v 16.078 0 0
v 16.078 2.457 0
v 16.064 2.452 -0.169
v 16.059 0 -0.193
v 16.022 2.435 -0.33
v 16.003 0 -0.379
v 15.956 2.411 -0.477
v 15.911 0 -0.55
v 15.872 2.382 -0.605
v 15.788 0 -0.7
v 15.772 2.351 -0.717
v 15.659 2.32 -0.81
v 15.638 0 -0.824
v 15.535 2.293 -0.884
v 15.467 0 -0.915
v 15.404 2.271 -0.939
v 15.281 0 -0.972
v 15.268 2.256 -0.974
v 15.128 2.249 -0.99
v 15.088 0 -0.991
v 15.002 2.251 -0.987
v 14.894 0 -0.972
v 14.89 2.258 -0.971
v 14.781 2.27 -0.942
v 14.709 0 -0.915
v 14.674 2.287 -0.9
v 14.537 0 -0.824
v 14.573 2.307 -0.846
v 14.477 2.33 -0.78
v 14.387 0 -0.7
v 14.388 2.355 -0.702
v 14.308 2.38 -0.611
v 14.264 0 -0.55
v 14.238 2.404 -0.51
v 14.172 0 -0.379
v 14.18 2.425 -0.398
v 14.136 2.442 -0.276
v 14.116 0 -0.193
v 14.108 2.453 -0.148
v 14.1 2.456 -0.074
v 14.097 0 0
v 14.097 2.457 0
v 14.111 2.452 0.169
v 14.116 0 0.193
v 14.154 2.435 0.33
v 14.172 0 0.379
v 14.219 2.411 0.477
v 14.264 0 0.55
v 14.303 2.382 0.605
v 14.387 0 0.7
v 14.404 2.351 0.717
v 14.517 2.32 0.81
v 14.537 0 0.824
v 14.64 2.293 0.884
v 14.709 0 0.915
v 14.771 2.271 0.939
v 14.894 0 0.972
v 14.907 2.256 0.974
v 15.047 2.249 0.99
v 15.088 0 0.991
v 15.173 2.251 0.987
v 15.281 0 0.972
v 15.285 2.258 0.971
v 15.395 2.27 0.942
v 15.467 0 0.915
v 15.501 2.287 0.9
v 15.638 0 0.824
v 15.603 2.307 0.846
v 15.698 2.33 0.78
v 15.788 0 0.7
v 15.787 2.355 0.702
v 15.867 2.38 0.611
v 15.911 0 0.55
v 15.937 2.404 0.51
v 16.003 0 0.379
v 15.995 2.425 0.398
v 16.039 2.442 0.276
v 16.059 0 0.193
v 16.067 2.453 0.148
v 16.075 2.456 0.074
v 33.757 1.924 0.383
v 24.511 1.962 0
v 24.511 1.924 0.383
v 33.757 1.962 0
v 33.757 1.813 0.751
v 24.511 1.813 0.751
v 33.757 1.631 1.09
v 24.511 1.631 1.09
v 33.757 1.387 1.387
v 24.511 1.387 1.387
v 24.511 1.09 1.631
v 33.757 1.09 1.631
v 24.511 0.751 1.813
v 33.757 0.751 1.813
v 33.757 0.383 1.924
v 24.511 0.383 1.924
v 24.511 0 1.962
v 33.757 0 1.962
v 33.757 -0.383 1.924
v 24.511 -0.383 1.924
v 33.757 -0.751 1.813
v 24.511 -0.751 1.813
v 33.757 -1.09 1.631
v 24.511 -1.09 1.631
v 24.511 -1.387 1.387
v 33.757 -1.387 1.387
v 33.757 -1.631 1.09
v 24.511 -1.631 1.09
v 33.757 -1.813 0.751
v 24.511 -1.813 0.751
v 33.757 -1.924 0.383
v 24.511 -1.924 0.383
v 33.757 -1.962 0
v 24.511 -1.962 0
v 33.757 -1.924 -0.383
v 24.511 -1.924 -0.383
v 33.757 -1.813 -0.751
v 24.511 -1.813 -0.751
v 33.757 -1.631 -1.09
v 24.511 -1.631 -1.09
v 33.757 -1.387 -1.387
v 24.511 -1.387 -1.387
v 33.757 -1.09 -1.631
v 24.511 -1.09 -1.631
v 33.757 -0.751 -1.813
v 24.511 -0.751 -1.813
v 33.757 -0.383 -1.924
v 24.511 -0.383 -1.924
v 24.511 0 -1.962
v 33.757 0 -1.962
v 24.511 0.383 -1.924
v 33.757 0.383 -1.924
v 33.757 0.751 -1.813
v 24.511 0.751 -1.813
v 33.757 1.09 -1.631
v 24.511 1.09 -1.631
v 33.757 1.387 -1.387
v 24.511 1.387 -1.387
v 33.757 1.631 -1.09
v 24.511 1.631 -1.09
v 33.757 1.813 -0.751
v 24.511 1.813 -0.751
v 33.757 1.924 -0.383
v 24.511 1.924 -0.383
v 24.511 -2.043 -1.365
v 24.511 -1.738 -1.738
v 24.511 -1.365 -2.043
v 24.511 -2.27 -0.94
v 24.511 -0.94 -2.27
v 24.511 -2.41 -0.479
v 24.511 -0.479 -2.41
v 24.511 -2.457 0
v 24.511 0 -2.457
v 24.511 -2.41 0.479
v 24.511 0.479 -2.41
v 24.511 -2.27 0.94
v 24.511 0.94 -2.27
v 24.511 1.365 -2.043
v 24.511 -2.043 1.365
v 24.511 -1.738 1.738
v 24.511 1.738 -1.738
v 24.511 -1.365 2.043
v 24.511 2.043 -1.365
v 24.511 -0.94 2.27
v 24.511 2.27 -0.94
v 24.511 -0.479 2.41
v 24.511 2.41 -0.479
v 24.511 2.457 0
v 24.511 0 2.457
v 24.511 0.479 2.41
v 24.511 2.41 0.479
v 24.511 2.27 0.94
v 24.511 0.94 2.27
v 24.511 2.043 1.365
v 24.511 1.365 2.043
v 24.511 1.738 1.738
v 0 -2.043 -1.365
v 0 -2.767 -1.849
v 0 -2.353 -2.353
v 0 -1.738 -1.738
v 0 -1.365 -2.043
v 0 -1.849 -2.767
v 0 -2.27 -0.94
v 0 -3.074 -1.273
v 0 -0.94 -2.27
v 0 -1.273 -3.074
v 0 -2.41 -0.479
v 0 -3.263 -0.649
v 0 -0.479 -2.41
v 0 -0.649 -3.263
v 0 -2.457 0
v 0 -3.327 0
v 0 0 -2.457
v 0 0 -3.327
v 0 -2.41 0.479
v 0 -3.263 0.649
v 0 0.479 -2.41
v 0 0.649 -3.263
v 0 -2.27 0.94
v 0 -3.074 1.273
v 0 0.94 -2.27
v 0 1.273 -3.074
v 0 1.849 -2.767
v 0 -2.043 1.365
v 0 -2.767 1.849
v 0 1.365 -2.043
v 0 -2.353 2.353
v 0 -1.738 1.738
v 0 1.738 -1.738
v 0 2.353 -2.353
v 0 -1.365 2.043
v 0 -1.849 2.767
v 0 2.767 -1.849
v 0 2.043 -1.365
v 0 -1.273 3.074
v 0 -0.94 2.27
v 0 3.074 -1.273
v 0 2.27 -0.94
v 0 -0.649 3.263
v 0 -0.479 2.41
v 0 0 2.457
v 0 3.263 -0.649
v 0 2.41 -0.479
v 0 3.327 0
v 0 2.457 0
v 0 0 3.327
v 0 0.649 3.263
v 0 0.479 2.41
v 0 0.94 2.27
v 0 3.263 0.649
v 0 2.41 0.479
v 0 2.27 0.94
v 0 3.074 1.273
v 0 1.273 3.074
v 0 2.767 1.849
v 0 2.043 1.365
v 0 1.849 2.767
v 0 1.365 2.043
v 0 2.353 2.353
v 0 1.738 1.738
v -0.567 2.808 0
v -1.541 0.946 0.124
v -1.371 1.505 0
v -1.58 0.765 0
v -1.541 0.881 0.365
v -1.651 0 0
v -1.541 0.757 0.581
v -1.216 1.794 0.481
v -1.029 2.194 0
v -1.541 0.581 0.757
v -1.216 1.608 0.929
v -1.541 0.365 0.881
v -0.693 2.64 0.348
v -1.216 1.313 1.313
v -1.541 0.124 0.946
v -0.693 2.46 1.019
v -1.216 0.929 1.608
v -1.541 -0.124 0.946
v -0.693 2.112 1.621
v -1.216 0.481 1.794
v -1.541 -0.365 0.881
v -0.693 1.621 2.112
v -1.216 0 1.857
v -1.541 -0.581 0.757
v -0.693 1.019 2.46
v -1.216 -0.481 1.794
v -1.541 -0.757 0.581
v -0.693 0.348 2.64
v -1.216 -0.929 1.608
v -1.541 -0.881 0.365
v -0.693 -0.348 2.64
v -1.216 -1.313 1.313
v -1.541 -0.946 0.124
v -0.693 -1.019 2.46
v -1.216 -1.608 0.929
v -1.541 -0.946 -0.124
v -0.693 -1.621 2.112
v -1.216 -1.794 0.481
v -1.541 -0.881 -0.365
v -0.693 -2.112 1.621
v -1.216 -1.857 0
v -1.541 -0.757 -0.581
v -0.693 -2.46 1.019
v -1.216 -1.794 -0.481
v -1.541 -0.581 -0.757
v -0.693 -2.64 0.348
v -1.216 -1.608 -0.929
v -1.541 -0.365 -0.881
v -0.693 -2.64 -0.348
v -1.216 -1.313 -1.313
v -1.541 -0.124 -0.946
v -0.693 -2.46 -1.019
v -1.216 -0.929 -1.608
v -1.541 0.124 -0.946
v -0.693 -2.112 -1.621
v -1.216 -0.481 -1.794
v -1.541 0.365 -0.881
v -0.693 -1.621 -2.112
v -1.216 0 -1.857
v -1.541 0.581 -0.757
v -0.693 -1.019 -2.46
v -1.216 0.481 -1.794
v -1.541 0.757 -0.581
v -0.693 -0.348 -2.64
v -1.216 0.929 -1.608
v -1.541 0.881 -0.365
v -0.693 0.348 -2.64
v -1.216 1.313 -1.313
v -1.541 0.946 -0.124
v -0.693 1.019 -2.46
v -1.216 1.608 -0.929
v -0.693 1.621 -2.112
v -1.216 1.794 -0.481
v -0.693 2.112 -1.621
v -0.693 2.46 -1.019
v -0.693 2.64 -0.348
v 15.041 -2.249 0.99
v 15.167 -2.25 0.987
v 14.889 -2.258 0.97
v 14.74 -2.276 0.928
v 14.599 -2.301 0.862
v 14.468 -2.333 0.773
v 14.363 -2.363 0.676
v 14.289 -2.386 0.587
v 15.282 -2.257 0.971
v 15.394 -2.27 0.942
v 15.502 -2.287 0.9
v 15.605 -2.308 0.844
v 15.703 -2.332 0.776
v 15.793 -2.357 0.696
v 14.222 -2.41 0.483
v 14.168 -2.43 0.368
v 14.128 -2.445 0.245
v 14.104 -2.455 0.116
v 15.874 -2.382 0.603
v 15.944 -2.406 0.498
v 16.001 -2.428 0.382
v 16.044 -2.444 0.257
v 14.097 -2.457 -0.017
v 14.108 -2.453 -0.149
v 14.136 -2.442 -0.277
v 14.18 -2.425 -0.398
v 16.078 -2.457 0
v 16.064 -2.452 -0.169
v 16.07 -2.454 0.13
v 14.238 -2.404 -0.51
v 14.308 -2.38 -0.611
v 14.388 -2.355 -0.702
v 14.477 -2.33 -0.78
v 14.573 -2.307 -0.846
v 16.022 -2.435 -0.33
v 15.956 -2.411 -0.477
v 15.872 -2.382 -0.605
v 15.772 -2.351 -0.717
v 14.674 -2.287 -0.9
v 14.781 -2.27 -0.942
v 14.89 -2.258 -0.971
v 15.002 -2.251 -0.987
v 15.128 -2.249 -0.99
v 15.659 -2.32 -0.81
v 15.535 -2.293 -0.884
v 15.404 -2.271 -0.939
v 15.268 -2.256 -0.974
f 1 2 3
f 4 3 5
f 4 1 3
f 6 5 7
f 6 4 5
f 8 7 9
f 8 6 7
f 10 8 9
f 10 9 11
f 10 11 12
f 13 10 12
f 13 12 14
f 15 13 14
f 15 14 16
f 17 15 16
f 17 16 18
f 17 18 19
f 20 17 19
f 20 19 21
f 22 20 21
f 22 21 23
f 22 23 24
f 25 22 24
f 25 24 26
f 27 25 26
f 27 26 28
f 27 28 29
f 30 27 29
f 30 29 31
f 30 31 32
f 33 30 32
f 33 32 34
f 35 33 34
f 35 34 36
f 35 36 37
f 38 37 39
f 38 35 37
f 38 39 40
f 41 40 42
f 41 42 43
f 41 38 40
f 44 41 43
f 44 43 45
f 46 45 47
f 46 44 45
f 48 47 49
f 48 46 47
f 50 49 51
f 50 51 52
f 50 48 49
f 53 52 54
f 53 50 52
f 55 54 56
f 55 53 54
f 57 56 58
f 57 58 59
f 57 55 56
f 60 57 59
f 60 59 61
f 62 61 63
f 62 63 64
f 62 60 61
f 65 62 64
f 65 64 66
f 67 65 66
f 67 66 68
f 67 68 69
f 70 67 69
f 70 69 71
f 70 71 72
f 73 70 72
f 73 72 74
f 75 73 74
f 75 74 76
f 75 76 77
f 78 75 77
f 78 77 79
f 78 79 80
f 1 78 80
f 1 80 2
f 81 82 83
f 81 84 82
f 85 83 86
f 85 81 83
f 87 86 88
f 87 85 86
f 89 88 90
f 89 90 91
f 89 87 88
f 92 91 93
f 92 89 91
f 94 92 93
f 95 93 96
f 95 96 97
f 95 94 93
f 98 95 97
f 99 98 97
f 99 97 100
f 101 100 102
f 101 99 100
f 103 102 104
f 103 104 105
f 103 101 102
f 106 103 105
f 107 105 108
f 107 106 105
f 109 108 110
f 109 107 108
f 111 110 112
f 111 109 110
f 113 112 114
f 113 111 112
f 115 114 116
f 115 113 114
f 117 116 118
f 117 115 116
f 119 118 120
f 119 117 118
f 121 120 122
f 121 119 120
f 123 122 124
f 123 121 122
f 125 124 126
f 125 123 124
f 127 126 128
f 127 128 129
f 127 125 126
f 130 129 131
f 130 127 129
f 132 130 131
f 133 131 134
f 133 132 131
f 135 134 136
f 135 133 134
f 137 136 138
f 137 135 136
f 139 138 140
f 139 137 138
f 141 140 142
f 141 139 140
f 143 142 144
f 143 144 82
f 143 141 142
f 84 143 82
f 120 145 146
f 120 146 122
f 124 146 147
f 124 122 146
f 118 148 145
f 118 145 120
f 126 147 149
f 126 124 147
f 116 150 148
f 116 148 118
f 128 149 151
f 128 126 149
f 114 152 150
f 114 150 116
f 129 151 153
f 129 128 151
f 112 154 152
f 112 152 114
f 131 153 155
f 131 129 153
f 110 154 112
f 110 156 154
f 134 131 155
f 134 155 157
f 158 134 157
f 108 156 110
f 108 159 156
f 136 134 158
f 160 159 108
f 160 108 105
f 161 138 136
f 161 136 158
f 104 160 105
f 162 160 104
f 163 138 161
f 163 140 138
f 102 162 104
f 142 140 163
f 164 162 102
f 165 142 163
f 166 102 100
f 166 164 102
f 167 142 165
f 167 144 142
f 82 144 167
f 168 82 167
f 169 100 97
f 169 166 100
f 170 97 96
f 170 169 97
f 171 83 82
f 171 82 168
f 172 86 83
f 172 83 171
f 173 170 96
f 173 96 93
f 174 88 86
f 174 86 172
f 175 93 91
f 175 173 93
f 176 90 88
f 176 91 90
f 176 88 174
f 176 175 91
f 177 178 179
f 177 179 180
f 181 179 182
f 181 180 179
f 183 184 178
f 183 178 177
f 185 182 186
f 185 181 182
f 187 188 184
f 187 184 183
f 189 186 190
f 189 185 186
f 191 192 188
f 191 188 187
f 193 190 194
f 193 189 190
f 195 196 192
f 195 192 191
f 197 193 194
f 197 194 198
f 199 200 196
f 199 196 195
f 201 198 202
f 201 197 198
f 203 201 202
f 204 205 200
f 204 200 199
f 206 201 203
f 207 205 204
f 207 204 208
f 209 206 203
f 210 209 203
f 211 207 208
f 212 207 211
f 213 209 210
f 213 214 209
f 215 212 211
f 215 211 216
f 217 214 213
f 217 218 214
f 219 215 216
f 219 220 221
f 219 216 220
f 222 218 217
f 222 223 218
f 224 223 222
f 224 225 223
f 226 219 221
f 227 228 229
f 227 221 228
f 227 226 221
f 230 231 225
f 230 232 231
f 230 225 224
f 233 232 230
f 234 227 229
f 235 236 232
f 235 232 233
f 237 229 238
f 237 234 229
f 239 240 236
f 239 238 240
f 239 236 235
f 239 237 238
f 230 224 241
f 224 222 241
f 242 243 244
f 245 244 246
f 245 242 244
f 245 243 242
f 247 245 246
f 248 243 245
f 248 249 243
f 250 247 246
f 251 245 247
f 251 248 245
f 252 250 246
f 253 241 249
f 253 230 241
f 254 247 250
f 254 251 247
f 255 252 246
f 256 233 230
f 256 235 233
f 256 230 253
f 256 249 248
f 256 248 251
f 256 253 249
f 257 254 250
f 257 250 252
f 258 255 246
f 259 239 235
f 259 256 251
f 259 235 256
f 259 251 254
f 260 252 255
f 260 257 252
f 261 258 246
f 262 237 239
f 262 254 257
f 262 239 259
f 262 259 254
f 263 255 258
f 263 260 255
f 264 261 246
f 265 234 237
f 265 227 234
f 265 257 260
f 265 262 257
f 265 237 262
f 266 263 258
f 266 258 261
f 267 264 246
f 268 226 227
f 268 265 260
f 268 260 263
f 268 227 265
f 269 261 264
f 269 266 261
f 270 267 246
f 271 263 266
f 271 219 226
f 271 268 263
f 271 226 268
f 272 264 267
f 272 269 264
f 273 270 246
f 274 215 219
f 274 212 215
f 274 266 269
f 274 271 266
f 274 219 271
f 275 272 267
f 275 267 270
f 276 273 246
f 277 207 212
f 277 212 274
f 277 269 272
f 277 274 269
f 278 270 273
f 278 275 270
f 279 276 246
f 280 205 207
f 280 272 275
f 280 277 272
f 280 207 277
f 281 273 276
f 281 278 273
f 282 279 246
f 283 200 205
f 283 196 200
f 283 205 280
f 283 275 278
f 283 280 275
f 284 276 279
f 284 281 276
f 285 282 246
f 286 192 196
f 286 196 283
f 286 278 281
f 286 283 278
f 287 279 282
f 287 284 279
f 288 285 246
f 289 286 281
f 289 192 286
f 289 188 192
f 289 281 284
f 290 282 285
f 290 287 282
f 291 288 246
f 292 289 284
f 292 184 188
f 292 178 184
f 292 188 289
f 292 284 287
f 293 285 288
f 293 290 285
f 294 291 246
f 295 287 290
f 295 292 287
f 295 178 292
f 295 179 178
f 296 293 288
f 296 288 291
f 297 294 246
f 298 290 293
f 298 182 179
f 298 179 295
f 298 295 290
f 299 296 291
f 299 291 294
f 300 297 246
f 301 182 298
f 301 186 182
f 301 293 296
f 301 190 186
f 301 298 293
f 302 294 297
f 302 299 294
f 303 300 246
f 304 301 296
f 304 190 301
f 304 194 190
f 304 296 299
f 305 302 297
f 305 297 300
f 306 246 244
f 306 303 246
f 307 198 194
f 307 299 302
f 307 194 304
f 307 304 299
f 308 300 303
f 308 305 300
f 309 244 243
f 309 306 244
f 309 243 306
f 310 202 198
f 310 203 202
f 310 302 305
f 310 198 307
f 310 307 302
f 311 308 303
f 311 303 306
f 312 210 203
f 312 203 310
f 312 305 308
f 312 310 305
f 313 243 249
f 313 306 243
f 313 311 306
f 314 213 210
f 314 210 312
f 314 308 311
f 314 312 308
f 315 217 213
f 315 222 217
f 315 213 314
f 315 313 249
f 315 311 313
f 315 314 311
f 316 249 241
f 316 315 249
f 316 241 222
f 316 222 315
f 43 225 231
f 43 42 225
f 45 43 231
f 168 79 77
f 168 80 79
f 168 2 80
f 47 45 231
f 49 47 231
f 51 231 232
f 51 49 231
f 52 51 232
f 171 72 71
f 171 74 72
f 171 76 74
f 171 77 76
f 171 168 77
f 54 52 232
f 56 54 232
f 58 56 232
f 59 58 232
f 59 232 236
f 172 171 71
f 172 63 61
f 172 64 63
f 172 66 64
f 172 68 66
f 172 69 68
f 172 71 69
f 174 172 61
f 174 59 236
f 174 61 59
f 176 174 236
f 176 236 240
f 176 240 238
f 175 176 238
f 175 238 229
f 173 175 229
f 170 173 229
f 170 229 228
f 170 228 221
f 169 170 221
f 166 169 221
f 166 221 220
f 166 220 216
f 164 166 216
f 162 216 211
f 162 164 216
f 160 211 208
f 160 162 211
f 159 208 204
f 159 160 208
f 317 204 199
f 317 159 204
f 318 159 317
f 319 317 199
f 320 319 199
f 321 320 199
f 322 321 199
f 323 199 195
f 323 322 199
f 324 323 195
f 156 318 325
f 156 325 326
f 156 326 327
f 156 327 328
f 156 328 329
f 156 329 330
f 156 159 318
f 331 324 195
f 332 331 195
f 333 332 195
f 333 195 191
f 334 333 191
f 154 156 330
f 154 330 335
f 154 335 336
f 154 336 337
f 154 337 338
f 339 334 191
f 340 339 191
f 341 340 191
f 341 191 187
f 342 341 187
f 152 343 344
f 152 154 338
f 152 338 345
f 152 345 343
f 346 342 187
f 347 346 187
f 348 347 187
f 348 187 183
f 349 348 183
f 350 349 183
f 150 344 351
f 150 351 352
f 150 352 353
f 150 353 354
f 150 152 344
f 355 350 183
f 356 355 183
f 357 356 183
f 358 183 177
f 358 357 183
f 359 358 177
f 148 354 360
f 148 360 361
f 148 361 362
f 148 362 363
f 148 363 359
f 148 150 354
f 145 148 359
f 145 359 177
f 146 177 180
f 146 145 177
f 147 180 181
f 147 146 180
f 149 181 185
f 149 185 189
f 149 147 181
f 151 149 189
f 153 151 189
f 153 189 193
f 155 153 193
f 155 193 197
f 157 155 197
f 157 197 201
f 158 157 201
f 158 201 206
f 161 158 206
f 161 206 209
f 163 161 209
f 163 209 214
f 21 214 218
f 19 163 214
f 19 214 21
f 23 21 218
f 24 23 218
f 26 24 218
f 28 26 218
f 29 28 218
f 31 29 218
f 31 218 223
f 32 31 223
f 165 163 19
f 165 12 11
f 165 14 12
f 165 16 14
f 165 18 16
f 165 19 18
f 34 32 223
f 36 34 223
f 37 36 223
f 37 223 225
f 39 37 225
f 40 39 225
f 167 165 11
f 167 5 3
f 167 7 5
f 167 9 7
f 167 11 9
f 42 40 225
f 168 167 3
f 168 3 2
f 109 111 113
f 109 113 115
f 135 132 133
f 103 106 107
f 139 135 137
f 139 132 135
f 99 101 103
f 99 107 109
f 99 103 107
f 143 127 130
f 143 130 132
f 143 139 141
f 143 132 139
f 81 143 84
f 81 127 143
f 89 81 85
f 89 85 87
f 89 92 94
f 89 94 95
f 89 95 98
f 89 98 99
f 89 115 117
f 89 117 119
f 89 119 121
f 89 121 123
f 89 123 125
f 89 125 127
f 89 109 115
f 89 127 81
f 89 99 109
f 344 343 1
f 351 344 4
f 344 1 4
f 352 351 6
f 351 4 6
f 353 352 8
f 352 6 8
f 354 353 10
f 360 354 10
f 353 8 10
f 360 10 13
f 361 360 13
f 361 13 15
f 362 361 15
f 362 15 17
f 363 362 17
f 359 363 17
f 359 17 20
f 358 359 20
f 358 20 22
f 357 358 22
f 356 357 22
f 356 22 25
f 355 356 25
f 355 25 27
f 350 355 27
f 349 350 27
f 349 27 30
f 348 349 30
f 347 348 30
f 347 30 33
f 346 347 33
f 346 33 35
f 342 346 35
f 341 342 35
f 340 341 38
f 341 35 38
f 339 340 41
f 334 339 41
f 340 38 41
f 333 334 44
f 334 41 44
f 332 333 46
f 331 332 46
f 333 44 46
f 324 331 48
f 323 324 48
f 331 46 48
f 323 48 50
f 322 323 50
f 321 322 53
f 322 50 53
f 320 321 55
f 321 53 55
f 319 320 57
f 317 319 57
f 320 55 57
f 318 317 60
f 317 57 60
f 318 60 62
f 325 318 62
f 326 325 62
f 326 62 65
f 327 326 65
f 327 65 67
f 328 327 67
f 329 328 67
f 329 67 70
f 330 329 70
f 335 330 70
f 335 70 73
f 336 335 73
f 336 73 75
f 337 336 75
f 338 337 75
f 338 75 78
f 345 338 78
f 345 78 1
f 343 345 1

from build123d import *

# Parameters (mm, degrees)
SKETCH4_R               = 0.9906
CUT_EXTRUDE1_DEPTH      = 4.3274
CUT_EXTRUDE1_DEPTH_BACK = 4.3274


with BuildPart() as part:
    # Sketch1 → Revolve1 (revolve)
    with BuildSketch(Plane.XY):
        with BuildLine():
            Line((0, 3.3274), (0, 2.45745))
            Line((0, 2.45745), (24.511, 2.45745))
            Line((24.511, 2.45745), (24.511, 1.96215))
            Line((24.511, 1.96215), (33.7566, 1.96215))
            Line((33.7566, 1.96215), (33.7566, 0))
            Line((33.7566, 0), (-1.651, 0))
            ThreePointArc((-1.651, 0), (-1.21556162, 1.857242025), (0, 3.3274))
        make_face()
    revolve(axis=Axis((0, 0, 0), (1, 0, 0)))

    # Sketch4 → Cut-Extrude1 (cut, two sides)
    with BuildSketch(Plane(origin=(0, 0, 0), x_dir=(1, 0, 0), z_dir=(0, 1, 0))) as cut_extrude1_sk:
        with Locations((15.0876, 0)):
            Circle(SKETCH4_R)
    extrude(amount=CUT_EXTRUDE1_DEPTH, mode=Mode.SUBTRACT)
    extrude(cut_extrude1_sk.sketch, amount=-CUT_EXTRUDE1_DEPTH_BACK, mode=Mode.SUBTRACT)


solid = part.part
